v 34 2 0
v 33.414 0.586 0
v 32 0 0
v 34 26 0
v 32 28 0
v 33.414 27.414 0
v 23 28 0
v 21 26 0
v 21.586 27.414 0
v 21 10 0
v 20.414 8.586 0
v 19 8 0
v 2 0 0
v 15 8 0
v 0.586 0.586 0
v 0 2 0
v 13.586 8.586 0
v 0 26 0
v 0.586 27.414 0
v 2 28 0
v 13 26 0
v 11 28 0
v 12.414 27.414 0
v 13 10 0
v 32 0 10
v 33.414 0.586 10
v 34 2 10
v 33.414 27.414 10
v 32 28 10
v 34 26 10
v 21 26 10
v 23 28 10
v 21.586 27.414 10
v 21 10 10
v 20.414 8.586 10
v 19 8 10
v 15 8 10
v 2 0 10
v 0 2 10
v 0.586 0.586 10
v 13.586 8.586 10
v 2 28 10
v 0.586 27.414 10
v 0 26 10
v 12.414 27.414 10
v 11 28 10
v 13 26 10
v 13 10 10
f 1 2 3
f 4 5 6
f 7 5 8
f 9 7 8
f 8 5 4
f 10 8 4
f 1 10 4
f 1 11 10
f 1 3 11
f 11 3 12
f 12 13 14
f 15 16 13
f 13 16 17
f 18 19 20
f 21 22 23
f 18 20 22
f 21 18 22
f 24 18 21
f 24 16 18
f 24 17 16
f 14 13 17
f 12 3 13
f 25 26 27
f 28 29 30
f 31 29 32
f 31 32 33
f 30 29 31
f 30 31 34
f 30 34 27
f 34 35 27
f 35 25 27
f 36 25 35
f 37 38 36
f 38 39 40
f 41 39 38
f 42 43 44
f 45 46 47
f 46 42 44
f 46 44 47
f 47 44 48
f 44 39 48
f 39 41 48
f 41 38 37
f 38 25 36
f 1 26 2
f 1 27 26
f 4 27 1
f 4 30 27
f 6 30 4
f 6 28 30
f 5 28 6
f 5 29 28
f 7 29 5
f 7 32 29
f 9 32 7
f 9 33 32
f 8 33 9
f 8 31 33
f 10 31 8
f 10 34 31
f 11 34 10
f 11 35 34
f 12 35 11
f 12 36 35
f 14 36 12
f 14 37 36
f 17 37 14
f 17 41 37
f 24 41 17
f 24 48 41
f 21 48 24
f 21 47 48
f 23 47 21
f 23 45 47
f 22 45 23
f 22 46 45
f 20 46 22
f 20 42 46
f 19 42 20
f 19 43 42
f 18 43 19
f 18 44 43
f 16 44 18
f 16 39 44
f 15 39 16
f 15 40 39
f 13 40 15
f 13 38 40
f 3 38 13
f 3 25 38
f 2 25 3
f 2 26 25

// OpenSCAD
$fn = 32;

// ----------------------------------------------------------------------
// Eye lug: clevis, 10 mm thick
// ----------------------------------------------------------------------

// --- parameters (mm) ---
profile_height = 10;      // extrusion height
profile_points = 24;      // points of the closed outline

profile = [[0, 2], [0.586, 0.586], [2, 0], [32, 0], [33.414, 0.586], [34, 2], [34, 26], [33.414, 27.414], [32, 28], [23, 28], [21.586, 27.414], [21, 26], [21, 10], [20.414, 8.586], [19, 8], [15, 8], [13.586, 8.586], [13, 10], [13, 26], [12.414, 27.414], [11, 28], [2, 28], [0.586, 27.414], [0, 26]];  // single closed polygon, 24 points, counter clockwise

// --- the one profile operation ---
linear_extrude(height = profile_height) polygon(points = profile);
